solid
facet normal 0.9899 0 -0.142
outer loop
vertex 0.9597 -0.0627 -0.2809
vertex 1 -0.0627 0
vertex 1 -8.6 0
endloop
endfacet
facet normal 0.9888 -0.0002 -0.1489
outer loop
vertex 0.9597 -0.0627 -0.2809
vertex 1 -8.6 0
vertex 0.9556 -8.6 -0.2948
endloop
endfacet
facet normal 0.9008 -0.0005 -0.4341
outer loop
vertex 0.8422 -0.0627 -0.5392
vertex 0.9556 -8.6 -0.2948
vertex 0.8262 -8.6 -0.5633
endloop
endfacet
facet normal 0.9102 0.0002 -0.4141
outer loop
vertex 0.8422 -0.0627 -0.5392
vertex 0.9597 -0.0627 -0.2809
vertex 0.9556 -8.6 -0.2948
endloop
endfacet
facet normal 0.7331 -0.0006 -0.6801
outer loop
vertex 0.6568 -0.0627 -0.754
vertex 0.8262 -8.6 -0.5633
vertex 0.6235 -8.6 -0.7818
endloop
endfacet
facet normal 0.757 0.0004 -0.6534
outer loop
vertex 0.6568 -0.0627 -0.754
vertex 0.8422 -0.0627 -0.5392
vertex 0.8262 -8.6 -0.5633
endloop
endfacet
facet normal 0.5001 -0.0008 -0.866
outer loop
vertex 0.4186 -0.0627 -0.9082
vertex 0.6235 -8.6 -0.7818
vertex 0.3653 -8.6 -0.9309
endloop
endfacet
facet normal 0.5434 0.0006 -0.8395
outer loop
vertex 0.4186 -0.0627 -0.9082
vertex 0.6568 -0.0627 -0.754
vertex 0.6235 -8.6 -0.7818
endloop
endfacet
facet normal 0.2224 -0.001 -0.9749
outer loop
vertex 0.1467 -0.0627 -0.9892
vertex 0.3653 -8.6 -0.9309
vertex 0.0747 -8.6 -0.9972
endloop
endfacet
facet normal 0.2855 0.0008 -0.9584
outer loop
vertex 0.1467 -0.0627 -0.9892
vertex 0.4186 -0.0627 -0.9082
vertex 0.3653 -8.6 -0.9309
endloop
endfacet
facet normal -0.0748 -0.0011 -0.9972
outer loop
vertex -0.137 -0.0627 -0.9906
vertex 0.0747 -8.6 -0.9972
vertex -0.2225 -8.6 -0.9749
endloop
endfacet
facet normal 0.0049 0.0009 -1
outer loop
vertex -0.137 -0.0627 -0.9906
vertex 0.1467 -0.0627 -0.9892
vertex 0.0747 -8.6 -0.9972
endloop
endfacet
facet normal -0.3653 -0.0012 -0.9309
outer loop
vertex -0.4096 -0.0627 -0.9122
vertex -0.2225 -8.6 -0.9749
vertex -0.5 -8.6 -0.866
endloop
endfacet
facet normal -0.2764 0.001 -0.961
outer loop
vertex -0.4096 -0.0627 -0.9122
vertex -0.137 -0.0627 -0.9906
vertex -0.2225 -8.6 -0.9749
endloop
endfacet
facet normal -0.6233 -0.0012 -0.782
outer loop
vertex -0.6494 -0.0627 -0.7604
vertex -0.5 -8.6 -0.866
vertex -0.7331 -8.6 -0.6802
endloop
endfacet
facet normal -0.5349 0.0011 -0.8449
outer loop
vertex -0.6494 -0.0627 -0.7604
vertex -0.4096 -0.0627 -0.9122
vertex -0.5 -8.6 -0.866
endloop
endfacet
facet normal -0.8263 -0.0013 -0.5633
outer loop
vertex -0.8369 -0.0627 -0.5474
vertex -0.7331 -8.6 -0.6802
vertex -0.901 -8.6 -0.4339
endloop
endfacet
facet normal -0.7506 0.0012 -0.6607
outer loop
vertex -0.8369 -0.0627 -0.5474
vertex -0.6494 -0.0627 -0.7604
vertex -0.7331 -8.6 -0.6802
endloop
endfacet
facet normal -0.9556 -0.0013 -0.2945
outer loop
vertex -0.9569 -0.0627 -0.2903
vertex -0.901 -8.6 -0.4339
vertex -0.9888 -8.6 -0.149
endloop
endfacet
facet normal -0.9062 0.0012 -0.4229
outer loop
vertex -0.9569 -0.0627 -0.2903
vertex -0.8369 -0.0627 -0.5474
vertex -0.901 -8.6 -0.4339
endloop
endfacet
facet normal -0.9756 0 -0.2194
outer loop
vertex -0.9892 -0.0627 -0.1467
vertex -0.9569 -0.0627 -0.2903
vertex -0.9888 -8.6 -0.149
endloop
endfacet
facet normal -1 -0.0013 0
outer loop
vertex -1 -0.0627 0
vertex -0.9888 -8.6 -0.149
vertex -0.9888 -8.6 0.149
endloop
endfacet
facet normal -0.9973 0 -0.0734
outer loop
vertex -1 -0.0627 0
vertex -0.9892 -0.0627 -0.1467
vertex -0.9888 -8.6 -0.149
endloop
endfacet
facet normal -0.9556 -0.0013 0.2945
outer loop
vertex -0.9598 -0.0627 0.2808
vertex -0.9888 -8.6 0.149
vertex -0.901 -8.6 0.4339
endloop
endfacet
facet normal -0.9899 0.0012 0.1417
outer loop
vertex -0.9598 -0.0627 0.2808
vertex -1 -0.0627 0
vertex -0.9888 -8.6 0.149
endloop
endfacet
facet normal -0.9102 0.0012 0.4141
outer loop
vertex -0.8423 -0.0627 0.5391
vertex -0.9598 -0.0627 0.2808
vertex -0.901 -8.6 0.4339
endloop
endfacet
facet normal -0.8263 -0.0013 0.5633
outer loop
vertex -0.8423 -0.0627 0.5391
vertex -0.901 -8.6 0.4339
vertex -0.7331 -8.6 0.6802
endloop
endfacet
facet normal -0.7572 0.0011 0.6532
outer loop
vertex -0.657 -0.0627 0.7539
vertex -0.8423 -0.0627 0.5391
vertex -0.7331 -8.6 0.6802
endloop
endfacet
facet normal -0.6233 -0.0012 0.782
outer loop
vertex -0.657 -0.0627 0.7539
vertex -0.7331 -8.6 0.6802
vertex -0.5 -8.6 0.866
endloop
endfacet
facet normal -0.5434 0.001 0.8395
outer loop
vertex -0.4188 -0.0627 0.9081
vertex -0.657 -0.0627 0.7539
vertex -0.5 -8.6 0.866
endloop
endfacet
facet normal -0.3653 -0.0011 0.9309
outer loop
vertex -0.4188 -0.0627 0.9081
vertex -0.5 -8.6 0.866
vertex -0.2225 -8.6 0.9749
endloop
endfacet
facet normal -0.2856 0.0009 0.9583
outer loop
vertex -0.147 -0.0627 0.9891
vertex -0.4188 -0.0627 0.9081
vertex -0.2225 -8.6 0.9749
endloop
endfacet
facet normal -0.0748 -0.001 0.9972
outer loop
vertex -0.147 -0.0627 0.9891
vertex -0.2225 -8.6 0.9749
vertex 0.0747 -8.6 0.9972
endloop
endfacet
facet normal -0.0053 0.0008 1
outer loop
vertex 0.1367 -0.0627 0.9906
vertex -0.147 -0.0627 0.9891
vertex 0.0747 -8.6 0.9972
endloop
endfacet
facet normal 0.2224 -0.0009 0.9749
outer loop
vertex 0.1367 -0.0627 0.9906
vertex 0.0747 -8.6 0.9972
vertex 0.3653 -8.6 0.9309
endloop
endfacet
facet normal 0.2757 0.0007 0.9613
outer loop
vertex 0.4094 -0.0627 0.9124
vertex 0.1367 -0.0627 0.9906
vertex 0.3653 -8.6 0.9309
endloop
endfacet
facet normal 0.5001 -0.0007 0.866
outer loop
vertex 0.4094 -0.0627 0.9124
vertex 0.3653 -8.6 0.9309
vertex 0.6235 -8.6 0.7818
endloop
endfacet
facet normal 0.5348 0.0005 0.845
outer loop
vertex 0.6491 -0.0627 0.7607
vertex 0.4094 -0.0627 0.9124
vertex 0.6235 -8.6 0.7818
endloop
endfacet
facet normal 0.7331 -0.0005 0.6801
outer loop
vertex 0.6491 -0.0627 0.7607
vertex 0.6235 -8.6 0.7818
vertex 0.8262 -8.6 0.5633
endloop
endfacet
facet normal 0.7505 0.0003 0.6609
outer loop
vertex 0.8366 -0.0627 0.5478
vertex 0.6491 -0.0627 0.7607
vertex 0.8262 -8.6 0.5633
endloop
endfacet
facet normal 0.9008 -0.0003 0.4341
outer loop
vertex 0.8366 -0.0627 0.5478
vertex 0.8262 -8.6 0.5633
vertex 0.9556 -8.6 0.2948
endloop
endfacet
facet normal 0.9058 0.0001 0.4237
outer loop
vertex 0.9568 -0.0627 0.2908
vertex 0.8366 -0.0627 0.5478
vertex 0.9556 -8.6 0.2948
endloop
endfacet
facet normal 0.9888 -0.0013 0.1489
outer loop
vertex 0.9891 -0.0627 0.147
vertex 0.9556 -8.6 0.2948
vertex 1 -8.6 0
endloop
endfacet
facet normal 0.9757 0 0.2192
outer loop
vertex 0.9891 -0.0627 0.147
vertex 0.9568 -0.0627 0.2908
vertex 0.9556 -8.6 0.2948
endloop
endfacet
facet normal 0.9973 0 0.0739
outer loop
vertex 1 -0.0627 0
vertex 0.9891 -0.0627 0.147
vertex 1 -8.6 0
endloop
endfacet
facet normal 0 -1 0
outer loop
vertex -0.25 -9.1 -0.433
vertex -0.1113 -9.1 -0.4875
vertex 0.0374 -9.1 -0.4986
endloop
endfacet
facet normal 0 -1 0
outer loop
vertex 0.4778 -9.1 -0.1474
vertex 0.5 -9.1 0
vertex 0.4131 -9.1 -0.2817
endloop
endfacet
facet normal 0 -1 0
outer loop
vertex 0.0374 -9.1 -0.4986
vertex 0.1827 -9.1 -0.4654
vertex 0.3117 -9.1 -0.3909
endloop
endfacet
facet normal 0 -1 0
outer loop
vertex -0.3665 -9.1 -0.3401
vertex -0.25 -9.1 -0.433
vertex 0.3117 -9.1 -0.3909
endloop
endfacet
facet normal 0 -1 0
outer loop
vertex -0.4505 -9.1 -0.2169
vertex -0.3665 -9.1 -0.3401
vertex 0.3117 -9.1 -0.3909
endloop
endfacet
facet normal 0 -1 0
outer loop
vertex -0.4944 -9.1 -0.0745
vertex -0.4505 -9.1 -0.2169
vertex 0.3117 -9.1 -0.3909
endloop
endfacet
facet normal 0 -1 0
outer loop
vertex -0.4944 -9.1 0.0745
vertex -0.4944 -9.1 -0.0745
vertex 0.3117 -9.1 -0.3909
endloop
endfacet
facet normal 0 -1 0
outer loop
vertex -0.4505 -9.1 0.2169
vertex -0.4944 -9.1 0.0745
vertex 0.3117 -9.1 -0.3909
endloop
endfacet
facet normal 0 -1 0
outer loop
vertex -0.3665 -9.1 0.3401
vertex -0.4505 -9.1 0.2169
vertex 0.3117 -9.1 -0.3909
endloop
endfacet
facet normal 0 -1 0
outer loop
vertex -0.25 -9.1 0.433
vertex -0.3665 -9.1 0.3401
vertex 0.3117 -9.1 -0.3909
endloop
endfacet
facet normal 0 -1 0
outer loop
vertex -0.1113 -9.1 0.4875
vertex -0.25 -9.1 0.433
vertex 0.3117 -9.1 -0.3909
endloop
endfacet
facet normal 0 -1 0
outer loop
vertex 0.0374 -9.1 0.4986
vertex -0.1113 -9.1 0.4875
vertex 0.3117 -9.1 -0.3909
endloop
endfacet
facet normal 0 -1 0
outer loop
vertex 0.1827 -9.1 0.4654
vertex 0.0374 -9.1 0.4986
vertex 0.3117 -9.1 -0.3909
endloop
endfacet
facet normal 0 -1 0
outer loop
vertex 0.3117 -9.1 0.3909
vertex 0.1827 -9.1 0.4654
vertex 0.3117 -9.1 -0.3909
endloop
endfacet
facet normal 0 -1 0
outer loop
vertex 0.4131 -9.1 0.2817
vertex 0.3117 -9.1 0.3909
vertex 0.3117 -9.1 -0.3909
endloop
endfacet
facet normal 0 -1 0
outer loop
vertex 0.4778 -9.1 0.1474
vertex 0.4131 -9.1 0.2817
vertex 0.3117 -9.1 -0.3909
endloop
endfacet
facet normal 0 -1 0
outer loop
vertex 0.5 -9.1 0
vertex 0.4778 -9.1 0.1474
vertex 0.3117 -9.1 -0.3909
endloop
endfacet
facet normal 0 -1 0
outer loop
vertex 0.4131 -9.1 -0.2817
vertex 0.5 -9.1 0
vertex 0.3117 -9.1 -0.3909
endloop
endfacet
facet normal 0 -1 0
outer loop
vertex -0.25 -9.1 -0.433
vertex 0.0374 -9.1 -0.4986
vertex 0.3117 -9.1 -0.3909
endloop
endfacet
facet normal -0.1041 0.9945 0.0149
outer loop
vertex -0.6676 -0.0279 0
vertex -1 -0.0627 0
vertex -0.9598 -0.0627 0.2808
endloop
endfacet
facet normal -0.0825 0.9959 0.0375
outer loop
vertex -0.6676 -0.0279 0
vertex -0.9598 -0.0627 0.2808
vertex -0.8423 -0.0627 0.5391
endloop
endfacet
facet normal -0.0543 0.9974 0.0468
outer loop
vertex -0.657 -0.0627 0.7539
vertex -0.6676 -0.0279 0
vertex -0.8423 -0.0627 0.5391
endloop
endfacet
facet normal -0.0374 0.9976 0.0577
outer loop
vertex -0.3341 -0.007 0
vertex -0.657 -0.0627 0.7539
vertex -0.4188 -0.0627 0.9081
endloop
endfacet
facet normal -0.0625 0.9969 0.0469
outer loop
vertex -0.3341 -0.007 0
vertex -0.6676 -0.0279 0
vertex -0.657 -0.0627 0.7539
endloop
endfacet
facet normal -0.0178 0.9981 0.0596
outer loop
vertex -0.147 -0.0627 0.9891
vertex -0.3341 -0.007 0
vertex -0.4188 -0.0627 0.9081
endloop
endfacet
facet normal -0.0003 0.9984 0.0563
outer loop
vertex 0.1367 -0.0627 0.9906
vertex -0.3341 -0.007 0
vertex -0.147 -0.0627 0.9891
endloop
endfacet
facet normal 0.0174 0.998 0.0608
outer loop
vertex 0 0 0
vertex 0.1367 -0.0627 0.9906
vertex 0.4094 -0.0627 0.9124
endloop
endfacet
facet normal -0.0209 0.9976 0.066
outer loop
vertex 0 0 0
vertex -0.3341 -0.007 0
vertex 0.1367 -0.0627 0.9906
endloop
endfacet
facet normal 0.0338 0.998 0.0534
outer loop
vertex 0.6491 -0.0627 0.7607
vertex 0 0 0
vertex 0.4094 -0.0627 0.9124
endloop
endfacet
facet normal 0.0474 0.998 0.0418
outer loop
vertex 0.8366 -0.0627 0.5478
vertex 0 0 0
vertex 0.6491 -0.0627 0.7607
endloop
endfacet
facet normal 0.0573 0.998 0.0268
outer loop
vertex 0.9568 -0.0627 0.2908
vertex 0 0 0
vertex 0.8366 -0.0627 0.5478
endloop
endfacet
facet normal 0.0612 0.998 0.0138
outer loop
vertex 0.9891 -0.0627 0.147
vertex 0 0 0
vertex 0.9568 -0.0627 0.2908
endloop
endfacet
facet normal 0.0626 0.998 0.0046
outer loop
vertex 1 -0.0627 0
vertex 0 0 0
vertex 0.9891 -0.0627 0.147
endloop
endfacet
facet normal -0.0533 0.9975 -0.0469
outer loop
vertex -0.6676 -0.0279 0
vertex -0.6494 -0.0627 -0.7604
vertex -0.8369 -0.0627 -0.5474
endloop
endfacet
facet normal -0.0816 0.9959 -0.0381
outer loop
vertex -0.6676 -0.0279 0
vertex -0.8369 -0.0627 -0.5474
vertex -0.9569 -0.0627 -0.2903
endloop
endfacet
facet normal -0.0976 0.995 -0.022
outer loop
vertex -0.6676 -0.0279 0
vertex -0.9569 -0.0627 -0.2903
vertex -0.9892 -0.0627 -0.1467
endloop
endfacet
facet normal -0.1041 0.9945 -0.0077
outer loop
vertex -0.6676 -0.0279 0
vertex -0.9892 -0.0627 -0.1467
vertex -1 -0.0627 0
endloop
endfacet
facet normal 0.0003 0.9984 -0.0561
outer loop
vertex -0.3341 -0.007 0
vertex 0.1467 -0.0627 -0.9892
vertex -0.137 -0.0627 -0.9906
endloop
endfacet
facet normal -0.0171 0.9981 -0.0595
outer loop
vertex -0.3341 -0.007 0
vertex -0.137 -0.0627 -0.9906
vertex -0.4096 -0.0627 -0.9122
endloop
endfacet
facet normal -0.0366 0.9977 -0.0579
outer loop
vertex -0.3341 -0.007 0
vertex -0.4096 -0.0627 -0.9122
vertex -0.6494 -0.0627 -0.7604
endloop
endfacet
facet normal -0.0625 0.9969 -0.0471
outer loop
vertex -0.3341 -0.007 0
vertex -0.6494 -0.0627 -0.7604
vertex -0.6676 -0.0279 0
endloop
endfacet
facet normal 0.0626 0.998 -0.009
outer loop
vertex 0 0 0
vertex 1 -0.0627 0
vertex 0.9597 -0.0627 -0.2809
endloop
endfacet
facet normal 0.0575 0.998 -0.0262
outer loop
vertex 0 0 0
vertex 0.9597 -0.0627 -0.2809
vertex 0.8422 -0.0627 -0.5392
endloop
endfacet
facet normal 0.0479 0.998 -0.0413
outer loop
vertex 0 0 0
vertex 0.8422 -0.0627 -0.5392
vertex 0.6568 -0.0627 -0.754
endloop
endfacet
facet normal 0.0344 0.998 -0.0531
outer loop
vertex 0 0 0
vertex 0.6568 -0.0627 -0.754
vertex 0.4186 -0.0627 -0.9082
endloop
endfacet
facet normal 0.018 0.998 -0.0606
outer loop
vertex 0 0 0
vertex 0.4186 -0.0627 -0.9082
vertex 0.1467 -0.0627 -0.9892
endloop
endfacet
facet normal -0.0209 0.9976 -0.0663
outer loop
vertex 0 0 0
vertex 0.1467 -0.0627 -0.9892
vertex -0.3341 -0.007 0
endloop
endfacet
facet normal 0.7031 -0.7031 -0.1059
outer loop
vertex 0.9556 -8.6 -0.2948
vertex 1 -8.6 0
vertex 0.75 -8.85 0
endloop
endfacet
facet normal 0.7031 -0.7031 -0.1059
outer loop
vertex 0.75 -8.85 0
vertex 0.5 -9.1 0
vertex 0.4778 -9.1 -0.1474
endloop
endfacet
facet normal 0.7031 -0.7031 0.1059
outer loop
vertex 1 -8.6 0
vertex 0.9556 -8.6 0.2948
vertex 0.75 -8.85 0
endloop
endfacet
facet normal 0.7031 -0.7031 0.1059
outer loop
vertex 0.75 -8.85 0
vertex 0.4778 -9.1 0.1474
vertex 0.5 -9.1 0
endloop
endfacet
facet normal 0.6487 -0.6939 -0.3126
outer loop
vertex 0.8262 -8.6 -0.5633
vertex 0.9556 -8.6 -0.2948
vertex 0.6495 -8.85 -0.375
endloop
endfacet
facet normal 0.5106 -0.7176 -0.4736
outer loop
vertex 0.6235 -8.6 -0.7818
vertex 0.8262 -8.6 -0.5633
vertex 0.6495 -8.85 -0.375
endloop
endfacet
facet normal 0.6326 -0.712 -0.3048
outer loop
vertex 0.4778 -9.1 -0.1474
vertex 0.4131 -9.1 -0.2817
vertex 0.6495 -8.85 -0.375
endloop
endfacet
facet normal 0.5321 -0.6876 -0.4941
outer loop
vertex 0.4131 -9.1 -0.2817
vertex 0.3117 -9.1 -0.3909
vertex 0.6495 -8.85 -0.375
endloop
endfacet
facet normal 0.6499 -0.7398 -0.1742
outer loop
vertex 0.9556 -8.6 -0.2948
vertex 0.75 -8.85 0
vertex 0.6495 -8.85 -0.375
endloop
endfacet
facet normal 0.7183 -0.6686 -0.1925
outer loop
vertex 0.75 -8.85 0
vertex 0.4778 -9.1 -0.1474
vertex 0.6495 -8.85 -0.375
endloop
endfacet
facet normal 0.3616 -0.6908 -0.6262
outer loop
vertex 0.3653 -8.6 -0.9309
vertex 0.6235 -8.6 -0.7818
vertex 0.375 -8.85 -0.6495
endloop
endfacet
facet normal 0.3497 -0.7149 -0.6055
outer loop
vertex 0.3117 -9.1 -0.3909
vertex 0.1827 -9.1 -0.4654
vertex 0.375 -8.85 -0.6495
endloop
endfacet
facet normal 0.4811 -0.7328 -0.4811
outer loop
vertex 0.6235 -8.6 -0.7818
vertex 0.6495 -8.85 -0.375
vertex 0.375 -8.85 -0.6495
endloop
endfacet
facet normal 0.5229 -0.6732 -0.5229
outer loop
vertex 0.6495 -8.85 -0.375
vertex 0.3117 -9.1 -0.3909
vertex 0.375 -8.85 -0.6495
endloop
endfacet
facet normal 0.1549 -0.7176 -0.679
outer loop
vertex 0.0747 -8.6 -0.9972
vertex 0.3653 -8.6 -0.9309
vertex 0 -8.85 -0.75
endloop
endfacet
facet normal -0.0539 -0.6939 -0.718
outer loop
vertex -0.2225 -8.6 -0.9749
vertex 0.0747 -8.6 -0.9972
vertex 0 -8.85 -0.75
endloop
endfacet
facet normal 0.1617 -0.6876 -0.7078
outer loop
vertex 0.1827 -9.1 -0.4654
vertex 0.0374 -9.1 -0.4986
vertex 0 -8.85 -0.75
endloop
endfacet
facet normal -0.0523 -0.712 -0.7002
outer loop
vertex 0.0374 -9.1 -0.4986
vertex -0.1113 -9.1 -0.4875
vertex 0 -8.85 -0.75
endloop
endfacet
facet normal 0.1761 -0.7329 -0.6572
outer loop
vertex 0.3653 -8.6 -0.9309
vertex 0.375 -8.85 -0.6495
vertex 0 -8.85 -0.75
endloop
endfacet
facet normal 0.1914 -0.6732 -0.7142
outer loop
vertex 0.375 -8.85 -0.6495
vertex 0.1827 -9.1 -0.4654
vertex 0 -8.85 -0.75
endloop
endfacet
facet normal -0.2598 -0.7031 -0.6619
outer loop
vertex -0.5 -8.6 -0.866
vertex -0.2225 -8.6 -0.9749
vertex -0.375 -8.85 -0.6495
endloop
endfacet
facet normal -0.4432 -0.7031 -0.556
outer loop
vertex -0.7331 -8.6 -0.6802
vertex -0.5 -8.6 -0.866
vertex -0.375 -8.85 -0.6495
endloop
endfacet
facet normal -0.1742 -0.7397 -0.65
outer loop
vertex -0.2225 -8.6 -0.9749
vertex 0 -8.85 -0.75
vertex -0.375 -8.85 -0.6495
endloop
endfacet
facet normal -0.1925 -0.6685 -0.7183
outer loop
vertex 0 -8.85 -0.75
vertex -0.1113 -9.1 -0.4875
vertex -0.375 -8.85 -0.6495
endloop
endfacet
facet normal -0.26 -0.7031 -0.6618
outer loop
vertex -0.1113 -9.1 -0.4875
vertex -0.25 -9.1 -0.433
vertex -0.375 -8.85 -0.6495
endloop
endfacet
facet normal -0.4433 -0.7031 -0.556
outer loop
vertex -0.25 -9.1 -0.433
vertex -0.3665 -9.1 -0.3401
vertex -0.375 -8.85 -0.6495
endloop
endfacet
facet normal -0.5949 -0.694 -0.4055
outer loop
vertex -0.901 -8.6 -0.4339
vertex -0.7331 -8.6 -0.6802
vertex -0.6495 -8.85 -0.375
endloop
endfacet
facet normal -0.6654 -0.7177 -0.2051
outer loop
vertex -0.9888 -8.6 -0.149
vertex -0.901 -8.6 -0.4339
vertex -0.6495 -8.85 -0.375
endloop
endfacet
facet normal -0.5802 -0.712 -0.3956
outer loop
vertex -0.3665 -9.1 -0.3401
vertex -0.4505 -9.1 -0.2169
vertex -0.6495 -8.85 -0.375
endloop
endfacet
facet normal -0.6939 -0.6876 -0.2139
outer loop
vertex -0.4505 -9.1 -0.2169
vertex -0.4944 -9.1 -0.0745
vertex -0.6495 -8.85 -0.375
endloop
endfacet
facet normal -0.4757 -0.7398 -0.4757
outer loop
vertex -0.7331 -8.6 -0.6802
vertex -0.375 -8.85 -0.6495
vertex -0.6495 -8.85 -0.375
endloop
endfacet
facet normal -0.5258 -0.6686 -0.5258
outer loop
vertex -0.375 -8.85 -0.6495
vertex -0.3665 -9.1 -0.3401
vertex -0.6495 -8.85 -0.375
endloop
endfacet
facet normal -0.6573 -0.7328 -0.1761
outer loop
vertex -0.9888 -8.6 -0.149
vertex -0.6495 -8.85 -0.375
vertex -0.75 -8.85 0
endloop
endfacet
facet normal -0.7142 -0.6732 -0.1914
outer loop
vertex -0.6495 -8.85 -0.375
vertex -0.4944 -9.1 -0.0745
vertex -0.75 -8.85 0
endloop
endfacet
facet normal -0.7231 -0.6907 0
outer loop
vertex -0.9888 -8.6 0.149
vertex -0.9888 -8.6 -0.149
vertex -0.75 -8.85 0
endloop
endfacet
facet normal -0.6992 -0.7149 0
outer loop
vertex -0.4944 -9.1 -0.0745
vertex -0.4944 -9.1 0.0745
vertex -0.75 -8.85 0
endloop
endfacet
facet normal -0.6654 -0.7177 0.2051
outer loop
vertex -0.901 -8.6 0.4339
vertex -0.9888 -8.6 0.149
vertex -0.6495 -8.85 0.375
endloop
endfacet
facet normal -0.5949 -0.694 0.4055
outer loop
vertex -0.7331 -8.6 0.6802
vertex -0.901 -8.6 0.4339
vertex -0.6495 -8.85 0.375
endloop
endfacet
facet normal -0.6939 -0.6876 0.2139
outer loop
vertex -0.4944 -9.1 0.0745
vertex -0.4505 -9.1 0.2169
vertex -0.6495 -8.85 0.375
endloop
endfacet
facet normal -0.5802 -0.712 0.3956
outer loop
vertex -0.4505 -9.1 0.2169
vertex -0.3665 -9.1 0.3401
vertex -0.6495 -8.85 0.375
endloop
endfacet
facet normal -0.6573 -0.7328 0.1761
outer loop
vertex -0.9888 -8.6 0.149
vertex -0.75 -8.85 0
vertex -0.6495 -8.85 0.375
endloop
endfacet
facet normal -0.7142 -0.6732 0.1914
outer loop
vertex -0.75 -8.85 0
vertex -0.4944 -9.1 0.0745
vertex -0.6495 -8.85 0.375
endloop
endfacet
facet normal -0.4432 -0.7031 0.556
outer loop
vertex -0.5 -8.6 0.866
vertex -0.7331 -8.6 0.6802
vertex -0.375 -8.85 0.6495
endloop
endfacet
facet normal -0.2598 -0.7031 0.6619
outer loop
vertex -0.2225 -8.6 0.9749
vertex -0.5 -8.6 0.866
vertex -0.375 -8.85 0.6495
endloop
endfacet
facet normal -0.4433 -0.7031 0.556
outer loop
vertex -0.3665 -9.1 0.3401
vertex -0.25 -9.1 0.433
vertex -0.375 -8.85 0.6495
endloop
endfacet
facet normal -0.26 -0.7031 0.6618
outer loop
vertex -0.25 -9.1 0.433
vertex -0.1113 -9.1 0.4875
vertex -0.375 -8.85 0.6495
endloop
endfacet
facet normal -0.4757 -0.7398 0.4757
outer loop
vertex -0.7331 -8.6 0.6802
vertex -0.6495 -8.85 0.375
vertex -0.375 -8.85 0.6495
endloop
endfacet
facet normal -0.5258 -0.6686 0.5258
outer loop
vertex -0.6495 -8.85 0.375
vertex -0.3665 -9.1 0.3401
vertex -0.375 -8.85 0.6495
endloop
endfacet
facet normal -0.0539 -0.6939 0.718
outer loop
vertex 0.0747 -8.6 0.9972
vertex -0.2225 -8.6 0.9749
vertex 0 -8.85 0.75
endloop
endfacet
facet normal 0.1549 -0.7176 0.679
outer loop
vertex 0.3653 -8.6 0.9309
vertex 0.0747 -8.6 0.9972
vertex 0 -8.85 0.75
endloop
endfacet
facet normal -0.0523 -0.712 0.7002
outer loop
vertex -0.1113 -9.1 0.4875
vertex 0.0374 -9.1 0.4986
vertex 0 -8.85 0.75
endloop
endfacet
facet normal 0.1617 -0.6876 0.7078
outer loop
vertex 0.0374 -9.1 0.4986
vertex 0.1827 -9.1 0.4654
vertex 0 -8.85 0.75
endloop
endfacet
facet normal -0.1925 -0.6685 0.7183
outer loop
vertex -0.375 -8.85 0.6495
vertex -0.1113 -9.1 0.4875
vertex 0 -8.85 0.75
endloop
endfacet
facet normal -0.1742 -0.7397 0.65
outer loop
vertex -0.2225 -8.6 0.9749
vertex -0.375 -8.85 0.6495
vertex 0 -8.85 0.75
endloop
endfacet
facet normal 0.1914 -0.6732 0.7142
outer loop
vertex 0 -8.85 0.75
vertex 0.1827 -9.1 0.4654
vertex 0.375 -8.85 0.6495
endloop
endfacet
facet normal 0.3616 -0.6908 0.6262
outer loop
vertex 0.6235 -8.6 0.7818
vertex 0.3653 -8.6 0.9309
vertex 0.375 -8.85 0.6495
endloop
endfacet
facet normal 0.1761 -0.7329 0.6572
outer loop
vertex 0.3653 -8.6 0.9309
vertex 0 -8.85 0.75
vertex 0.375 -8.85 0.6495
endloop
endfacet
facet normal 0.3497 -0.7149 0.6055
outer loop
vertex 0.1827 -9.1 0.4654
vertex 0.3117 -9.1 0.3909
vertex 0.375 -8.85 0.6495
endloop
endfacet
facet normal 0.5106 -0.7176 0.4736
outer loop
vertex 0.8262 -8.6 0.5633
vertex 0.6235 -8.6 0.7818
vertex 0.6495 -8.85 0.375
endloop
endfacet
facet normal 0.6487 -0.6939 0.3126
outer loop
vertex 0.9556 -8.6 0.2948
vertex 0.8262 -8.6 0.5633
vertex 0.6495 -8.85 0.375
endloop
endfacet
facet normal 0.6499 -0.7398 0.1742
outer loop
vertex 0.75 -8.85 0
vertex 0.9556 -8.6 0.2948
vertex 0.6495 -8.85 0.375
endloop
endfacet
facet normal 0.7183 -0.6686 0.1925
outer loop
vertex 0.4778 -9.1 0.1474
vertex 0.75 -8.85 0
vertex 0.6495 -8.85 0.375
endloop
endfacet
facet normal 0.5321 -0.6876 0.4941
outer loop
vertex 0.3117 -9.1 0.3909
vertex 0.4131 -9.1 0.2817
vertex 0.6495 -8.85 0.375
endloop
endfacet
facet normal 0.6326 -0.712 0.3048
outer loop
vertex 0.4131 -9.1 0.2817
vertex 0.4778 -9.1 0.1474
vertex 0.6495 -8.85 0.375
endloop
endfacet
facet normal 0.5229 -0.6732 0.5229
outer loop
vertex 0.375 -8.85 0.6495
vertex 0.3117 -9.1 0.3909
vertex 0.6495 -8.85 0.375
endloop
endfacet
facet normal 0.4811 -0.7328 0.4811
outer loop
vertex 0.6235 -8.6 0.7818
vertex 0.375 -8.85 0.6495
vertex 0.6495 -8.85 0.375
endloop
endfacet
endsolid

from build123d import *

# Parameters (mm, degrees)
SKETCH1_R                 = 1
BOSS_EXTRUDE_9_10MM_DEPTH = 9.1
F_0_5_X_45_DEG_SIZE       = 0.5


with BuildPart() as part:
    # Sketch1 → Boss-Extrude 9.10mm (new body)
    with BuildSketch(Plane(origin=(0, 0, 0), x_dir=(1, 0, 0), z_dir=(0, 1, 0))):
        Circle(SKETCH1_R)
    extrude(amount=-BOSS_EXTRUDE_9_10MM_DEPTH)

    # 0.5 x 45 deg
    f_0_5_x_45_deg_edges = [part.edges().sort_by_distance(p)[0] for p in [
        (-1, -9.1, 0),
    ]]
    chamfer(f_0_5_x_45_deg_edges, length=F_0_5_X_45_DEG_SIZE)

    # Sketch2 → SR8 (revolve, cut)
    with BuildSketch(Plane.XY):
        with BuildLine():
            Line((0, 2), (-2, 2))
            Line((-2, 2), (-2, -0.254033308))
            ThreePointArc((-2, -0.254033308), (-1.00803434, -0.06376243), (0, 0))
            Line((0, 0), (0, 2))
        make_face()
    revolve(axis=Axis((0, 0, 0), (0, 1, 0)), mode=Mode.SUBTRACT)


solid = part.part
